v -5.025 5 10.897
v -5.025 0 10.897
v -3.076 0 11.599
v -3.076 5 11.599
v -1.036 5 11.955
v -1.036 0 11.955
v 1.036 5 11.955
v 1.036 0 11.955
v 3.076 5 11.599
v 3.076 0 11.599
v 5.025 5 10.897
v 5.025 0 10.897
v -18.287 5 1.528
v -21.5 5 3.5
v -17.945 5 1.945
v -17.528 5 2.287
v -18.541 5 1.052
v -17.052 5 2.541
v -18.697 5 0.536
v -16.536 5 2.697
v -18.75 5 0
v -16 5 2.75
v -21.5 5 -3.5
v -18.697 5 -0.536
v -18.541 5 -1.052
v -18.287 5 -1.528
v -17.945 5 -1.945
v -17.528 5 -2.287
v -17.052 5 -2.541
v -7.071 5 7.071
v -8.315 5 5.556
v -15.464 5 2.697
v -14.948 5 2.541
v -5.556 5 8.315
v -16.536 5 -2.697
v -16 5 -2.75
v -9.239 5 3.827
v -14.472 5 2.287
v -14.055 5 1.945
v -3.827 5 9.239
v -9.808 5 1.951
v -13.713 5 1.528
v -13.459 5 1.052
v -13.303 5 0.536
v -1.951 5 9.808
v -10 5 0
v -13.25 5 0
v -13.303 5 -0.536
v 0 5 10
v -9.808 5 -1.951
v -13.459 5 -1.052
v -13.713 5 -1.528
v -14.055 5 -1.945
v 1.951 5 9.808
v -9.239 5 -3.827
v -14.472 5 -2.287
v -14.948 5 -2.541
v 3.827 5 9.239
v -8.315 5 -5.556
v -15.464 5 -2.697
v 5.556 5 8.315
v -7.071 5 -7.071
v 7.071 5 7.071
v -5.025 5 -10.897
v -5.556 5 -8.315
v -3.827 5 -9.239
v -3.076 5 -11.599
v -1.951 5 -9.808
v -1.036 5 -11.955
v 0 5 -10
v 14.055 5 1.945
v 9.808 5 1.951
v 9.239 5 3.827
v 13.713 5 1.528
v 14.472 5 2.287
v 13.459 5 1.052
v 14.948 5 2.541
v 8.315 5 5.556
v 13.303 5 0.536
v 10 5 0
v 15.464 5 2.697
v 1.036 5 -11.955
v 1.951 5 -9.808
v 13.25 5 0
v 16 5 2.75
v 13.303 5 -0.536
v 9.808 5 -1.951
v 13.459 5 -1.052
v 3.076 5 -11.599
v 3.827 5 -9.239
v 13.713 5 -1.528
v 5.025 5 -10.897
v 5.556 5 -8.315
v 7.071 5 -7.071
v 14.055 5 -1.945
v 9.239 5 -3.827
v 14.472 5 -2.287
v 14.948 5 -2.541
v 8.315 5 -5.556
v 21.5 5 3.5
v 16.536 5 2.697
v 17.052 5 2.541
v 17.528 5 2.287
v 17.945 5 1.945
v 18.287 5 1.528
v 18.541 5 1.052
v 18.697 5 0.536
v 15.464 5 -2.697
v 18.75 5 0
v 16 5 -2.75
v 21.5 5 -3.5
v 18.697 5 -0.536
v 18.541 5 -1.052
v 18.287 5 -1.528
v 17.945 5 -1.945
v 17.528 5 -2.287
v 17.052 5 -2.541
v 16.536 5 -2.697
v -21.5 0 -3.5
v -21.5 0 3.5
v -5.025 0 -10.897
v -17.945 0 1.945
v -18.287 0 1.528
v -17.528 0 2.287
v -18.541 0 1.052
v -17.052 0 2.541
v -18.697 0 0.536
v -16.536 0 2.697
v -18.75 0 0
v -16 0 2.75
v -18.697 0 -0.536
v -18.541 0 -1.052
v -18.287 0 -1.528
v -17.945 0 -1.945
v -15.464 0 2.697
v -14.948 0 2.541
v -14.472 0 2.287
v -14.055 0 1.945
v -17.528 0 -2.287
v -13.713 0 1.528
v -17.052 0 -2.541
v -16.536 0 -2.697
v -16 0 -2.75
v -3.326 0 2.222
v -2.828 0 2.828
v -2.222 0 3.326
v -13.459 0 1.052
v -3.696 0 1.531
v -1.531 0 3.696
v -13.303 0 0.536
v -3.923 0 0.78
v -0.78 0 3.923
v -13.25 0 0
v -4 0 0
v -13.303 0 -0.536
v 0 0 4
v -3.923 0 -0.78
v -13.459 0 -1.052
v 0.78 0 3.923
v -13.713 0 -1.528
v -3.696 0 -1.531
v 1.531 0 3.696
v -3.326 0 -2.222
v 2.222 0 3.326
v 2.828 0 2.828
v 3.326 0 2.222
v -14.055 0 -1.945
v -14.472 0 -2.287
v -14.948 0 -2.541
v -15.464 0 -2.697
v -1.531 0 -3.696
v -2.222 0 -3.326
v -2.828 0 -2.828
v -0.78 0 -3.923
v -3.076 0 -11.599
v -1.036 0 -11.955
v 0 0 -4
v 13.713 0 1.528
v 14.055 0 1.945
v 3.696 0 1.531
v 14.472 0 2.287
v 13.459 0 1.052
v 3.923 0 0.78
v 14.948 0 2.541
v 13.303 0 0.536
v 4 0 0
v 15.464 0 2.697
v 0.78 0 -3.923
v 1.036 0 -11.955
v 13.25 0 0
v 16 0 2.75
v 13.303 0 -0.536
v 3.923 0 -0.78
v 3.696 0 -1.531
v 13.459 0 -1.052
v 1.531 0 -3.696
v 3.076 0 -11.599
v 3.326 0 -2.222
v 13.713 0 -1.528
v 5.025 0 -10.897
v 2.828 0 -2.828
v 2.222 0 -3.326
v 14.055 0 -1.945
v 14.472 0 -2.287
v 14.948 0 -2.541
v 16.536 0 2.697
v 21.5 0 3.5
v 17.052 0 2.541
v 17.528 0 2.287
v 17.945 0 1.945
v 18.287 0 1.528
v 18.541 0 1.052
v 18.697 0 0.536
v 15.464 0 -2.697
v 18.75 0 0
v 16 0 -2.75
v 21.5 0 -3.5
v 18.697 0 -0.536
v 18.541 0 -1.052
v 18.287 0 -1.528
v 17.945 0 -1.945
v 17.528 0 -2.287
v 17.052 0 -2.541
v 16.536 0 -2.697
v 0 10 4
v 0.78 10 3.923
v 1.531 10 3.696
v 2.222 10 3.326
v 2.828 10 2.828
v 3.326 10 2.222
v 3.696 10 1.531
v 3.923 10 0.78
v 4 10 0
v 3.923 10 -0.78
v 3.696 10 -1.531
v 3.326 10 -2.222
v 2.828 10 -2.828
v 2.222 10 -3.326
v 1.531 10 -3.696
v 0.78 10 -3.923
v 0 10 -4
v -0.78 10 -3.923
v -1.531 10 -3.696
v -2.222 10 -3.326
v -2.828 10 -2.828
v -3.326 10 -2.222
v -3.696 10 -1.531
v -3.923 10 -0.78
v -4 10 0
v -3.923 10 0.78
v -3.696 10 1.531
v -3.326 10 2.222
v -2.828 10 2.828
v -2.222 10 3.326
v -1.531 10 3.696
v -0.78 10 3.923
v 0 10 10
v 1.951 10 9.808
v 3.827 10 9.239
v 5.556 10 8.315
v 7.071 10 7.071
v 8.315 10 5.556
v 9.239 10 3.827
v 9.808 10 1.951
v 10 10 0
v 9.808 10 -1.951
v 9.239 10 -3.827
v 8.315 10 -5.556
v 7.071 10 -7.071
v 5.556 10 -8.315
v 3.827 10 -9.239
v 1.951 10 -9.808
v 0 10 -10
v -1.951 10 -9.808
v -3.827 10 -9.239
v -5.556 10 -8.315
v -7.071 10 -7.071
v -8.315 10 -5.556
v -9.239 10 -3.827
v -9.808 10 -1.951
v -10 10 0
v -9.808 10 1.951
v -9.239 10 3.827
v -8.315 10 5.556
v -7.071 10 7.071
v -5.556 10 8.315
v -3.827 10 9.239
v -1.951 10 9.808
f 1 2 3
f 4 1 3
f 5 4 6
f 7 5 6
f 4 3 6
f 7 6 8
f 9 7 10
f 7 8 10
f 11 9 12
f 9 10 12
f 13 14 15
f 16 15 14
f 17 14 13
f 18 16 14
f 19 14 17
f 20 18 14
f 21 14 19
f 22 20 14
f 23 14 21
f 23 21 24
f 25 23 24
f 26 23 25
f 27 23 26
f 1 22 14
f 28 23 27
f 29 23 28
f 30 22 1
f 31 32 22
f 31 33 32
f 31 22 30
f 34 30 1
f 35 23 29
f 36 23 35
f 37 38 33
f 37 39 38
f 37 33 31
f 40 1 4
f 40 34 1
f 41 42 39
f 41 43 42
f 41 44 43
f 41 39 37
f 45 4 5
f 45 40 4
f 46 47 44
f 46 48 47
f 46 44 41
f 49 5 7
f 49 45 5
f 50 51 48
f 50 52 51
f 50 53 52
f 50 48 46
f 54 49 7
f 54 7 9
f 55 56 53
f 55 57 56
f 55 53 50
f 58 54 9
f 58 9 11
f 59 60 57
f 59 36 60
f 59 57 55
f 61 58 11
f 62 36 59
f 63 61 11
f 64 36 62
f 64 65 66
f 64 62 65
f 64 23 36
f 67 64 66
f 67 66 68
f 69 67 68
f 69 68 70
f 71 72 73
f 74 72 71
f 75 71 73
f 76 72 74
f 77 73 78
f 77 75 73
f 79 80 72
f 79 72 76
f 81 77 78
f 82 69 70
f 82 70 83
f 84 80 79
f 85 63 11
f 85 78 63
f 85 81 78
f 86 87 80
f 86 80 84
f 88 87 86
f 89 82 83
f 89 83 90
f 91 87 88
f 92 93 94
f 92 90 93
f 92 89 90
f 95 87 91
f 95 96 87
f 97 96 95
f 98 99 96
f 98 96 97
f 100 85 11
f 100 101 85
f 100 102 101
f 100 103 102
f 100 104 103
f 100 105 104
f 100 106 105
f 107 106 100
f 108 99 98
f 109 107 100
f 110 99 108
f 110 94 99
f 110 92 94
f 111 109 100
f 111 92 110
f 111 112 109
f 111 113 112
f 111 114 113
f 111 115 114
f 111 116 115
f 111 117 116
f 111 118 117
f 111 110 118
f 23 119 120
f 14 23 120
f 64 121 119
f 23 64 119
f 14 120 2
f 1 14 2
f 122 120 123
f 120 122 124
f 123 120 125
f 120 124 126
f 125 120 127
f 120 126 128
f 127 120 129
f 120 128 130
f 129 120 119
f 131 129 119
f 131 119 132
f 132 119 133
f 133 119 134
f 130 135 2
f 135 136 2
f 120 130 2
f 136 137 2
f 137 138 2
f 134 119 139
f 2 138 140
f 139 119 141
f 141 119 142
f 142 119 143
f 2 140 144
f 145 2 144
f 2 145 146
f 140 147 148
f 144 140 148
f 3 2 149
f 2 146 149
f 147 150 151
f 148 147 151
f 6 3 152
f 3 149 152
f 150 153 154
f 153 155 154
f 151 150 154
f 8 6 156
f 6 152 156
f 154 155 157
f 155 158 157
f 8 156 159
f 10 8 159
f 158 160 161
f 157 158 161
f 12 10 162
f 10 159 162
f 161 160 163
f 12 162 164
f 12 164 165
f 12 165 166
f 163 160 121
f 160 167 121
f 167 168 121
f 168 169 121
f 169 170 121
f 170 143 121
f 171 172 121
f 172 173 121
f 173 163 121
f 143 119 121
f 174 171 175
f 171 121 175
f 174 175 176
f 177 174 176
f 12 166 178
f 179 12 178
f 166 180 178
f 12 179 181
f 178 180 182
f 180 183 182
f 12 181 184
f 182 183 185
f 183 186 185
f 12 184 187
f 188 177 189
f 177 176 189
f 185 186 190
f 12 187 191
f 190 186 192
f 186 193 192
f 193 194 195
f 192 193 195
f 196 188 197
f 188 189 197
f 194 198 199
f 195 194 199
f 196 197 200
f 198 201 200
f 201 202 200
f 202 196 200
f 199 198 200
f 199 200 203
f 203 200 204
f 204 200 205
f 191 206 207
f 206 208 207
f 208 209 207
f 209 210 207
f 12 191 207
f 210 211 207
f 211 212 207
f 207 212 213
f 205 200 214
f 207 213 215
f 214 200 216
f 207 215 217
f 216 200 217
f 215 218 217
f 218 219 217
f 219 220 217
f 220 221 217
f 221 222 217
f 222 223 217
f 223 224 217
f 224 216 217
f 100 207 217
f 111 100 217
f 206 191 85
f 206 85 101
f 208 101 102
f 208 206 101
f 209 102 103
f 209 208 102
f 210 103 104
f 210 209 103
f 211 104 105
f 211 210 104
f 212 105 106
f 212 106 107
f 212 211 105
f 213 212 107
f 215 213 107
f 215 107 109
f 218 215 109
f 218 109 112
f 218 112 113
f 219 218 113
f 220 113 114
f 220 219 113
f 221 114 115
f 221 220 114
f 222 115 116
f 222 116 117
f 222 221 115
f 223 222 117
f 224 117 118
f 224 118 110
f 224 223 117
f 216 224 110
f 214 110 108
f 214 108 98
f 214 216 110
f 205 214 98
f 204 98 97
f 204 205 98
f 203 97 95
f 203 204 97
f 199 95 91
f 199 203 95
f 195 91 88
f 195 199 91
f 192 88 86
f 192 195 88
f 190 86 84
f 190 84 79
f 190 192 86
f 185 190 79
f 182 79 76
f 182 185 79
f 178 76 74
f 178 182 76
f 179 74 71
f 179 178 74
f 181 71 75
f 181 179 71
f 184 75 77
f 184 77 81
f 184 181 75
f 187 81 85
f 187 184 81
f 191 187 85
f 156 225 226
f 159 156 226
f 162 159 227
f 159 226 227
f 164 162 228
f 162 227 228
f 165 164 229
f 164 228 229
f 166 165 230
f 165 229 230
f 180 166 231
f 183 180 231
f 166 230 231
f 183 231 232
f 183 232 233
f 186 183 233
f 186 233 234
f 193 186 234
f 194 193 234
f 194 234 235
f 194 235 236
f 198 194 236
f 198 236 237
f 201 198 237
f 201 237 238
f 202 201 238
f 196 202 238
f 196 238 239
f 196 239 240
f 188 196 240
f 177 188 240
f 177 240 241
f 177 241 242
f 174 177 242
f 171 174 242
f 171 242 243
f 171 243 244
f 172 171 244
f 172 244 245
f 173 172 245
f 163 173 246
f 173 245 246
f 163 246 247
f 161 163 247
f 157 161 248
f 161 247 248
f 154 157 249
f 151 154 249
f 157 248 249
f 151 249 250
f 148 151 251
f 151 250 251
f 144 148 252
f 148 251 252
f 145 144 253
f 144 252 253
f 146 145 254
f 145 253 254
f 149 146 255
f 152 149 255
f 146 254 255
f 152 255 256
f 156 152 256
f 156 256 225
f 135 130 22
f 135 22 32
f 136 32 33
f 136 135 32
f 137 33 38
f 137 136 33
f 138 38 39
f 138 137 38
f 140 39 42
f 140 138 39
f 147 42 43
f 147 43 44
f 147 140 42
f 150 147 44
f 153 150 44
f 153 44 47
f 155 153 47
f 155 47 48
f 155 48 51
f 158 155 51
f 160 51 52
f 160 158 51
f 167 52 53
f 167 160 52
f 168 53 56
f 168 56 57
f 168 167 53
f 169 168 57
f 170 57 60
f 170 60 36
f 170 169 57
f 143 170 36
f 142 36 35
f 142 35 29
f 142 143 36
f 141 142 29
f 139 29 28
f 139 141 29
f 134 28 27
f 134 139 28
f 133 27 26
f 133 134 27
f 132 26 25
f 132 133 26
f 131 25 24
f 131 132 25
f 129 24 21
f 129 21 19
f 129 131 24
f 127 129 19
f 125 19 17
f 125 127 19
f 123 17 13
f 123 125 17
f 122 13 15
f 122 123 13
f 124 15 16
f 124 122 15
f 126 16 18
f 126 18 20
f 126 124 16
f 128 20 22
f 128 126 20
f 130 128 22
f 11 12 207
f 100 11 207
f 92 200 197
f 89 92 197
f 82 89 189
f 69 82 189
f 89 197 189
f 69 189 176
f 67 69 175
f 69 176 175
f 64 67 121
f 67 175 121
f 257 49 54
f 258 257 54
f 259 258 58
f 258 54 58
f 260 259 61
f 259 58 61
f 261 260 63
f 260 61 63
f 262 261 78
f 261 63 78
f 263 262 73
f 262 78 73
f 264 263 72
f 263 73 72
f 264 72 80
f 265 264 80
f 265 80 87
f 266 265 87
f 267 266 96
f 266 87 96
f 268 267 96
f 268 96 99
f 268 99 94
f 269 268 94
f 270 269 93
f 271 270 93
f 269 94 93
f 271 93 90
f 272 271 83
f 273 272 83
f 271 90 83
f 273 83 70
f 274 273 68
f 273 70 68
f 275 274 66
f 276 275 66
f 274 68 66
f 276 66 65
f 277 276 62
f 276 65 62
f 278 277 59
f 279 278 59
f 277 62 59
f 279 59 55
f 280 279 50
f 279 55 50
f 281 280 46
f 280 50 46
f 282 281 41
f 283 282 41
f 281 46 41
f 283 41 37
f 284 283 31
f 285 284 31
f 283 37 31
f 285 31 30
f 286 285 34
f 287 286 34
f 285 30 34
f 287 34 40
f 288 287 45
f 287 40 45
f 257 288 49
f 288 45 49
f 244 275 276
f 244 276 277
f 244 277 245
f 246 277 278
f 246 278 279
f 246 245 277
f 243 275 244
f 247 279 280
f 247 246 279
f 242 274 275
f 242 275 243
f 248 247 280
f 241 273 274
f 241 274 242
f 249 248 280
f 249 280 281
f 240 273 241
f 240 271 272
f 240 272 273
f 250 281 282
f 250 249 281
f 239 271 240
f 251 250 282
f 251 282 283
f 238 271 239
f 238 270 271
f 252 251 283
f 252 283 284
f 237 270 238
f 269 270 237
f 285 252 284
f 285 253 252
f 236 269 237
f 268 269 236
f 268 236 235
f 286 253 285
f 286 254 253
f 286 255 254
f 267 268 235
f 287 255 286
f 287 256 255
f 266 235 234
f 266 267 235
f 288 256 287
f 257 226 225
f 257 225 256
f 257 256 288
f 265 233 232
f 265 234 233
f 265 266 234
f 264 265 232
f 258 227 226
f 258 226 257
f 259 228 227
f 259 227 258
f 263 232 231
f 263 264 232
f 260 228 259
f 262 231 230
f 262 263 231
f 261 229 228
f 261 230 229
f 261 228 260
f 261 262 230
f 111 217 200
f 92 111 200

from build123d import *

# Parameters (mm, degrees)
SKETCH1_R           = 2.75
SKETCH1_R_2         = 12
BOSS_EXTRUDE1_DEPTH = 5
SKETCH2_R           = 10
BOSS_EXTRUDE2_DEPTH = 5
CUT_EXTRUDE1_REACH  = 28.575
SKETCH3_R           = 4


with BuildPart() as part:
    # Sketch1 → Boss-Extrude1 (new body)
    # profile 1 of 3: a face of its own
    with BuildSketch(Plane(origin=(0, 0, 0), x_dir=(1, 0, 0), z_dir=(0, 1, 0))):
        with BuildLine():
            Line((21.5, 3.5), (5.025448323, 10.897011937))
            ThreePointArc((5.025448323, 10.897011937), (10.10706139, 6.468949688), (12, 0))
            ThreePointArc((12, 0), (10.10706139, -6.468949688), (5.025448323, -10.897011937))
            Line((5.025448323, -10.897011937), (21.5, -3.5))
            Line((21.5, -3.5), (21.5, 3.5))
        make_face()
        with Locations(Location((16, 0, 0), (0, 0, 270))):
            Circle(SKETCH1_R, mode=Mode.SUBTRACT)
    # profile 2 of 3: a face of its own
    with BuildSketch(Plane(origin=(0, 0, 0), x_dir=(1, 0, 0), z_dir=(0, 1, 0))):
        Circle(SKETCH1_R_2)
    # profile 3 of 3: a face of its own
    with BuildSketch(Plane(origin=(0, 0, 0), x_dir=(1, 0, 0), z_dir=(0, 1, 0))):
        with BuildLine():
            Line((-5.025448323, 10.897011937), (-21.5, 3.5))
            Line((-21.5, 3.5), (-21.5, -3.5))
            Line((-21.5, -3.5), (-5.025448323, -10.897011937))
            ThreePointArc((-5.025448323, -10.897011937), (-12, 0), (-5.025448323, 10.897011937))
        make_face()
        with Locations(Location((-16, 0, 0), (0, 0, 270))):
            Circle(SKETCH1_R, mode=Mode.SUBTRACT)
    extrude(amount=BOSS_EXTRUDE1_DEPTH)

    # Sketch2 → Boss-Extrude2 (add)
    with BuildSketch(Plane(origin=(0, 5, 0), x_dir=(1, 0, 0), z_dir=(0, 1, 0))):
        with Locations(Location((0, 0, 0), (0, 0, 270))):
            Circle(SKETCH2_R)
    extrude(amount=BOSS_EXTRUDE2_DEPTH)

    # Sketch3 → Cut-Extrude1 (cut, up to next)
    with BuildSketch(Plane(origin=(0, 10, 0), x_dir=(1, 0, 0), z_dir=(0, 1, 0)), mode=Mode.PRIVATE) as cut_extrude1_sk1:
        with Locations(Location((0, 0, 0), (0, 0, 270))):
            Circle(SKETCH3_R)
    cut_extrude1_tool1 = extrude(cut_extrude1_sk1.sketch, amount=-CUT_EXTRUDE1_REACH, mode=Mode.PRIVATE) & part.part
    add(cut_extrude1_tool1.solids().sort_by_distance((0, 10, 0))[0], mode=Mode.SUBTRACT)


solid = part.part
